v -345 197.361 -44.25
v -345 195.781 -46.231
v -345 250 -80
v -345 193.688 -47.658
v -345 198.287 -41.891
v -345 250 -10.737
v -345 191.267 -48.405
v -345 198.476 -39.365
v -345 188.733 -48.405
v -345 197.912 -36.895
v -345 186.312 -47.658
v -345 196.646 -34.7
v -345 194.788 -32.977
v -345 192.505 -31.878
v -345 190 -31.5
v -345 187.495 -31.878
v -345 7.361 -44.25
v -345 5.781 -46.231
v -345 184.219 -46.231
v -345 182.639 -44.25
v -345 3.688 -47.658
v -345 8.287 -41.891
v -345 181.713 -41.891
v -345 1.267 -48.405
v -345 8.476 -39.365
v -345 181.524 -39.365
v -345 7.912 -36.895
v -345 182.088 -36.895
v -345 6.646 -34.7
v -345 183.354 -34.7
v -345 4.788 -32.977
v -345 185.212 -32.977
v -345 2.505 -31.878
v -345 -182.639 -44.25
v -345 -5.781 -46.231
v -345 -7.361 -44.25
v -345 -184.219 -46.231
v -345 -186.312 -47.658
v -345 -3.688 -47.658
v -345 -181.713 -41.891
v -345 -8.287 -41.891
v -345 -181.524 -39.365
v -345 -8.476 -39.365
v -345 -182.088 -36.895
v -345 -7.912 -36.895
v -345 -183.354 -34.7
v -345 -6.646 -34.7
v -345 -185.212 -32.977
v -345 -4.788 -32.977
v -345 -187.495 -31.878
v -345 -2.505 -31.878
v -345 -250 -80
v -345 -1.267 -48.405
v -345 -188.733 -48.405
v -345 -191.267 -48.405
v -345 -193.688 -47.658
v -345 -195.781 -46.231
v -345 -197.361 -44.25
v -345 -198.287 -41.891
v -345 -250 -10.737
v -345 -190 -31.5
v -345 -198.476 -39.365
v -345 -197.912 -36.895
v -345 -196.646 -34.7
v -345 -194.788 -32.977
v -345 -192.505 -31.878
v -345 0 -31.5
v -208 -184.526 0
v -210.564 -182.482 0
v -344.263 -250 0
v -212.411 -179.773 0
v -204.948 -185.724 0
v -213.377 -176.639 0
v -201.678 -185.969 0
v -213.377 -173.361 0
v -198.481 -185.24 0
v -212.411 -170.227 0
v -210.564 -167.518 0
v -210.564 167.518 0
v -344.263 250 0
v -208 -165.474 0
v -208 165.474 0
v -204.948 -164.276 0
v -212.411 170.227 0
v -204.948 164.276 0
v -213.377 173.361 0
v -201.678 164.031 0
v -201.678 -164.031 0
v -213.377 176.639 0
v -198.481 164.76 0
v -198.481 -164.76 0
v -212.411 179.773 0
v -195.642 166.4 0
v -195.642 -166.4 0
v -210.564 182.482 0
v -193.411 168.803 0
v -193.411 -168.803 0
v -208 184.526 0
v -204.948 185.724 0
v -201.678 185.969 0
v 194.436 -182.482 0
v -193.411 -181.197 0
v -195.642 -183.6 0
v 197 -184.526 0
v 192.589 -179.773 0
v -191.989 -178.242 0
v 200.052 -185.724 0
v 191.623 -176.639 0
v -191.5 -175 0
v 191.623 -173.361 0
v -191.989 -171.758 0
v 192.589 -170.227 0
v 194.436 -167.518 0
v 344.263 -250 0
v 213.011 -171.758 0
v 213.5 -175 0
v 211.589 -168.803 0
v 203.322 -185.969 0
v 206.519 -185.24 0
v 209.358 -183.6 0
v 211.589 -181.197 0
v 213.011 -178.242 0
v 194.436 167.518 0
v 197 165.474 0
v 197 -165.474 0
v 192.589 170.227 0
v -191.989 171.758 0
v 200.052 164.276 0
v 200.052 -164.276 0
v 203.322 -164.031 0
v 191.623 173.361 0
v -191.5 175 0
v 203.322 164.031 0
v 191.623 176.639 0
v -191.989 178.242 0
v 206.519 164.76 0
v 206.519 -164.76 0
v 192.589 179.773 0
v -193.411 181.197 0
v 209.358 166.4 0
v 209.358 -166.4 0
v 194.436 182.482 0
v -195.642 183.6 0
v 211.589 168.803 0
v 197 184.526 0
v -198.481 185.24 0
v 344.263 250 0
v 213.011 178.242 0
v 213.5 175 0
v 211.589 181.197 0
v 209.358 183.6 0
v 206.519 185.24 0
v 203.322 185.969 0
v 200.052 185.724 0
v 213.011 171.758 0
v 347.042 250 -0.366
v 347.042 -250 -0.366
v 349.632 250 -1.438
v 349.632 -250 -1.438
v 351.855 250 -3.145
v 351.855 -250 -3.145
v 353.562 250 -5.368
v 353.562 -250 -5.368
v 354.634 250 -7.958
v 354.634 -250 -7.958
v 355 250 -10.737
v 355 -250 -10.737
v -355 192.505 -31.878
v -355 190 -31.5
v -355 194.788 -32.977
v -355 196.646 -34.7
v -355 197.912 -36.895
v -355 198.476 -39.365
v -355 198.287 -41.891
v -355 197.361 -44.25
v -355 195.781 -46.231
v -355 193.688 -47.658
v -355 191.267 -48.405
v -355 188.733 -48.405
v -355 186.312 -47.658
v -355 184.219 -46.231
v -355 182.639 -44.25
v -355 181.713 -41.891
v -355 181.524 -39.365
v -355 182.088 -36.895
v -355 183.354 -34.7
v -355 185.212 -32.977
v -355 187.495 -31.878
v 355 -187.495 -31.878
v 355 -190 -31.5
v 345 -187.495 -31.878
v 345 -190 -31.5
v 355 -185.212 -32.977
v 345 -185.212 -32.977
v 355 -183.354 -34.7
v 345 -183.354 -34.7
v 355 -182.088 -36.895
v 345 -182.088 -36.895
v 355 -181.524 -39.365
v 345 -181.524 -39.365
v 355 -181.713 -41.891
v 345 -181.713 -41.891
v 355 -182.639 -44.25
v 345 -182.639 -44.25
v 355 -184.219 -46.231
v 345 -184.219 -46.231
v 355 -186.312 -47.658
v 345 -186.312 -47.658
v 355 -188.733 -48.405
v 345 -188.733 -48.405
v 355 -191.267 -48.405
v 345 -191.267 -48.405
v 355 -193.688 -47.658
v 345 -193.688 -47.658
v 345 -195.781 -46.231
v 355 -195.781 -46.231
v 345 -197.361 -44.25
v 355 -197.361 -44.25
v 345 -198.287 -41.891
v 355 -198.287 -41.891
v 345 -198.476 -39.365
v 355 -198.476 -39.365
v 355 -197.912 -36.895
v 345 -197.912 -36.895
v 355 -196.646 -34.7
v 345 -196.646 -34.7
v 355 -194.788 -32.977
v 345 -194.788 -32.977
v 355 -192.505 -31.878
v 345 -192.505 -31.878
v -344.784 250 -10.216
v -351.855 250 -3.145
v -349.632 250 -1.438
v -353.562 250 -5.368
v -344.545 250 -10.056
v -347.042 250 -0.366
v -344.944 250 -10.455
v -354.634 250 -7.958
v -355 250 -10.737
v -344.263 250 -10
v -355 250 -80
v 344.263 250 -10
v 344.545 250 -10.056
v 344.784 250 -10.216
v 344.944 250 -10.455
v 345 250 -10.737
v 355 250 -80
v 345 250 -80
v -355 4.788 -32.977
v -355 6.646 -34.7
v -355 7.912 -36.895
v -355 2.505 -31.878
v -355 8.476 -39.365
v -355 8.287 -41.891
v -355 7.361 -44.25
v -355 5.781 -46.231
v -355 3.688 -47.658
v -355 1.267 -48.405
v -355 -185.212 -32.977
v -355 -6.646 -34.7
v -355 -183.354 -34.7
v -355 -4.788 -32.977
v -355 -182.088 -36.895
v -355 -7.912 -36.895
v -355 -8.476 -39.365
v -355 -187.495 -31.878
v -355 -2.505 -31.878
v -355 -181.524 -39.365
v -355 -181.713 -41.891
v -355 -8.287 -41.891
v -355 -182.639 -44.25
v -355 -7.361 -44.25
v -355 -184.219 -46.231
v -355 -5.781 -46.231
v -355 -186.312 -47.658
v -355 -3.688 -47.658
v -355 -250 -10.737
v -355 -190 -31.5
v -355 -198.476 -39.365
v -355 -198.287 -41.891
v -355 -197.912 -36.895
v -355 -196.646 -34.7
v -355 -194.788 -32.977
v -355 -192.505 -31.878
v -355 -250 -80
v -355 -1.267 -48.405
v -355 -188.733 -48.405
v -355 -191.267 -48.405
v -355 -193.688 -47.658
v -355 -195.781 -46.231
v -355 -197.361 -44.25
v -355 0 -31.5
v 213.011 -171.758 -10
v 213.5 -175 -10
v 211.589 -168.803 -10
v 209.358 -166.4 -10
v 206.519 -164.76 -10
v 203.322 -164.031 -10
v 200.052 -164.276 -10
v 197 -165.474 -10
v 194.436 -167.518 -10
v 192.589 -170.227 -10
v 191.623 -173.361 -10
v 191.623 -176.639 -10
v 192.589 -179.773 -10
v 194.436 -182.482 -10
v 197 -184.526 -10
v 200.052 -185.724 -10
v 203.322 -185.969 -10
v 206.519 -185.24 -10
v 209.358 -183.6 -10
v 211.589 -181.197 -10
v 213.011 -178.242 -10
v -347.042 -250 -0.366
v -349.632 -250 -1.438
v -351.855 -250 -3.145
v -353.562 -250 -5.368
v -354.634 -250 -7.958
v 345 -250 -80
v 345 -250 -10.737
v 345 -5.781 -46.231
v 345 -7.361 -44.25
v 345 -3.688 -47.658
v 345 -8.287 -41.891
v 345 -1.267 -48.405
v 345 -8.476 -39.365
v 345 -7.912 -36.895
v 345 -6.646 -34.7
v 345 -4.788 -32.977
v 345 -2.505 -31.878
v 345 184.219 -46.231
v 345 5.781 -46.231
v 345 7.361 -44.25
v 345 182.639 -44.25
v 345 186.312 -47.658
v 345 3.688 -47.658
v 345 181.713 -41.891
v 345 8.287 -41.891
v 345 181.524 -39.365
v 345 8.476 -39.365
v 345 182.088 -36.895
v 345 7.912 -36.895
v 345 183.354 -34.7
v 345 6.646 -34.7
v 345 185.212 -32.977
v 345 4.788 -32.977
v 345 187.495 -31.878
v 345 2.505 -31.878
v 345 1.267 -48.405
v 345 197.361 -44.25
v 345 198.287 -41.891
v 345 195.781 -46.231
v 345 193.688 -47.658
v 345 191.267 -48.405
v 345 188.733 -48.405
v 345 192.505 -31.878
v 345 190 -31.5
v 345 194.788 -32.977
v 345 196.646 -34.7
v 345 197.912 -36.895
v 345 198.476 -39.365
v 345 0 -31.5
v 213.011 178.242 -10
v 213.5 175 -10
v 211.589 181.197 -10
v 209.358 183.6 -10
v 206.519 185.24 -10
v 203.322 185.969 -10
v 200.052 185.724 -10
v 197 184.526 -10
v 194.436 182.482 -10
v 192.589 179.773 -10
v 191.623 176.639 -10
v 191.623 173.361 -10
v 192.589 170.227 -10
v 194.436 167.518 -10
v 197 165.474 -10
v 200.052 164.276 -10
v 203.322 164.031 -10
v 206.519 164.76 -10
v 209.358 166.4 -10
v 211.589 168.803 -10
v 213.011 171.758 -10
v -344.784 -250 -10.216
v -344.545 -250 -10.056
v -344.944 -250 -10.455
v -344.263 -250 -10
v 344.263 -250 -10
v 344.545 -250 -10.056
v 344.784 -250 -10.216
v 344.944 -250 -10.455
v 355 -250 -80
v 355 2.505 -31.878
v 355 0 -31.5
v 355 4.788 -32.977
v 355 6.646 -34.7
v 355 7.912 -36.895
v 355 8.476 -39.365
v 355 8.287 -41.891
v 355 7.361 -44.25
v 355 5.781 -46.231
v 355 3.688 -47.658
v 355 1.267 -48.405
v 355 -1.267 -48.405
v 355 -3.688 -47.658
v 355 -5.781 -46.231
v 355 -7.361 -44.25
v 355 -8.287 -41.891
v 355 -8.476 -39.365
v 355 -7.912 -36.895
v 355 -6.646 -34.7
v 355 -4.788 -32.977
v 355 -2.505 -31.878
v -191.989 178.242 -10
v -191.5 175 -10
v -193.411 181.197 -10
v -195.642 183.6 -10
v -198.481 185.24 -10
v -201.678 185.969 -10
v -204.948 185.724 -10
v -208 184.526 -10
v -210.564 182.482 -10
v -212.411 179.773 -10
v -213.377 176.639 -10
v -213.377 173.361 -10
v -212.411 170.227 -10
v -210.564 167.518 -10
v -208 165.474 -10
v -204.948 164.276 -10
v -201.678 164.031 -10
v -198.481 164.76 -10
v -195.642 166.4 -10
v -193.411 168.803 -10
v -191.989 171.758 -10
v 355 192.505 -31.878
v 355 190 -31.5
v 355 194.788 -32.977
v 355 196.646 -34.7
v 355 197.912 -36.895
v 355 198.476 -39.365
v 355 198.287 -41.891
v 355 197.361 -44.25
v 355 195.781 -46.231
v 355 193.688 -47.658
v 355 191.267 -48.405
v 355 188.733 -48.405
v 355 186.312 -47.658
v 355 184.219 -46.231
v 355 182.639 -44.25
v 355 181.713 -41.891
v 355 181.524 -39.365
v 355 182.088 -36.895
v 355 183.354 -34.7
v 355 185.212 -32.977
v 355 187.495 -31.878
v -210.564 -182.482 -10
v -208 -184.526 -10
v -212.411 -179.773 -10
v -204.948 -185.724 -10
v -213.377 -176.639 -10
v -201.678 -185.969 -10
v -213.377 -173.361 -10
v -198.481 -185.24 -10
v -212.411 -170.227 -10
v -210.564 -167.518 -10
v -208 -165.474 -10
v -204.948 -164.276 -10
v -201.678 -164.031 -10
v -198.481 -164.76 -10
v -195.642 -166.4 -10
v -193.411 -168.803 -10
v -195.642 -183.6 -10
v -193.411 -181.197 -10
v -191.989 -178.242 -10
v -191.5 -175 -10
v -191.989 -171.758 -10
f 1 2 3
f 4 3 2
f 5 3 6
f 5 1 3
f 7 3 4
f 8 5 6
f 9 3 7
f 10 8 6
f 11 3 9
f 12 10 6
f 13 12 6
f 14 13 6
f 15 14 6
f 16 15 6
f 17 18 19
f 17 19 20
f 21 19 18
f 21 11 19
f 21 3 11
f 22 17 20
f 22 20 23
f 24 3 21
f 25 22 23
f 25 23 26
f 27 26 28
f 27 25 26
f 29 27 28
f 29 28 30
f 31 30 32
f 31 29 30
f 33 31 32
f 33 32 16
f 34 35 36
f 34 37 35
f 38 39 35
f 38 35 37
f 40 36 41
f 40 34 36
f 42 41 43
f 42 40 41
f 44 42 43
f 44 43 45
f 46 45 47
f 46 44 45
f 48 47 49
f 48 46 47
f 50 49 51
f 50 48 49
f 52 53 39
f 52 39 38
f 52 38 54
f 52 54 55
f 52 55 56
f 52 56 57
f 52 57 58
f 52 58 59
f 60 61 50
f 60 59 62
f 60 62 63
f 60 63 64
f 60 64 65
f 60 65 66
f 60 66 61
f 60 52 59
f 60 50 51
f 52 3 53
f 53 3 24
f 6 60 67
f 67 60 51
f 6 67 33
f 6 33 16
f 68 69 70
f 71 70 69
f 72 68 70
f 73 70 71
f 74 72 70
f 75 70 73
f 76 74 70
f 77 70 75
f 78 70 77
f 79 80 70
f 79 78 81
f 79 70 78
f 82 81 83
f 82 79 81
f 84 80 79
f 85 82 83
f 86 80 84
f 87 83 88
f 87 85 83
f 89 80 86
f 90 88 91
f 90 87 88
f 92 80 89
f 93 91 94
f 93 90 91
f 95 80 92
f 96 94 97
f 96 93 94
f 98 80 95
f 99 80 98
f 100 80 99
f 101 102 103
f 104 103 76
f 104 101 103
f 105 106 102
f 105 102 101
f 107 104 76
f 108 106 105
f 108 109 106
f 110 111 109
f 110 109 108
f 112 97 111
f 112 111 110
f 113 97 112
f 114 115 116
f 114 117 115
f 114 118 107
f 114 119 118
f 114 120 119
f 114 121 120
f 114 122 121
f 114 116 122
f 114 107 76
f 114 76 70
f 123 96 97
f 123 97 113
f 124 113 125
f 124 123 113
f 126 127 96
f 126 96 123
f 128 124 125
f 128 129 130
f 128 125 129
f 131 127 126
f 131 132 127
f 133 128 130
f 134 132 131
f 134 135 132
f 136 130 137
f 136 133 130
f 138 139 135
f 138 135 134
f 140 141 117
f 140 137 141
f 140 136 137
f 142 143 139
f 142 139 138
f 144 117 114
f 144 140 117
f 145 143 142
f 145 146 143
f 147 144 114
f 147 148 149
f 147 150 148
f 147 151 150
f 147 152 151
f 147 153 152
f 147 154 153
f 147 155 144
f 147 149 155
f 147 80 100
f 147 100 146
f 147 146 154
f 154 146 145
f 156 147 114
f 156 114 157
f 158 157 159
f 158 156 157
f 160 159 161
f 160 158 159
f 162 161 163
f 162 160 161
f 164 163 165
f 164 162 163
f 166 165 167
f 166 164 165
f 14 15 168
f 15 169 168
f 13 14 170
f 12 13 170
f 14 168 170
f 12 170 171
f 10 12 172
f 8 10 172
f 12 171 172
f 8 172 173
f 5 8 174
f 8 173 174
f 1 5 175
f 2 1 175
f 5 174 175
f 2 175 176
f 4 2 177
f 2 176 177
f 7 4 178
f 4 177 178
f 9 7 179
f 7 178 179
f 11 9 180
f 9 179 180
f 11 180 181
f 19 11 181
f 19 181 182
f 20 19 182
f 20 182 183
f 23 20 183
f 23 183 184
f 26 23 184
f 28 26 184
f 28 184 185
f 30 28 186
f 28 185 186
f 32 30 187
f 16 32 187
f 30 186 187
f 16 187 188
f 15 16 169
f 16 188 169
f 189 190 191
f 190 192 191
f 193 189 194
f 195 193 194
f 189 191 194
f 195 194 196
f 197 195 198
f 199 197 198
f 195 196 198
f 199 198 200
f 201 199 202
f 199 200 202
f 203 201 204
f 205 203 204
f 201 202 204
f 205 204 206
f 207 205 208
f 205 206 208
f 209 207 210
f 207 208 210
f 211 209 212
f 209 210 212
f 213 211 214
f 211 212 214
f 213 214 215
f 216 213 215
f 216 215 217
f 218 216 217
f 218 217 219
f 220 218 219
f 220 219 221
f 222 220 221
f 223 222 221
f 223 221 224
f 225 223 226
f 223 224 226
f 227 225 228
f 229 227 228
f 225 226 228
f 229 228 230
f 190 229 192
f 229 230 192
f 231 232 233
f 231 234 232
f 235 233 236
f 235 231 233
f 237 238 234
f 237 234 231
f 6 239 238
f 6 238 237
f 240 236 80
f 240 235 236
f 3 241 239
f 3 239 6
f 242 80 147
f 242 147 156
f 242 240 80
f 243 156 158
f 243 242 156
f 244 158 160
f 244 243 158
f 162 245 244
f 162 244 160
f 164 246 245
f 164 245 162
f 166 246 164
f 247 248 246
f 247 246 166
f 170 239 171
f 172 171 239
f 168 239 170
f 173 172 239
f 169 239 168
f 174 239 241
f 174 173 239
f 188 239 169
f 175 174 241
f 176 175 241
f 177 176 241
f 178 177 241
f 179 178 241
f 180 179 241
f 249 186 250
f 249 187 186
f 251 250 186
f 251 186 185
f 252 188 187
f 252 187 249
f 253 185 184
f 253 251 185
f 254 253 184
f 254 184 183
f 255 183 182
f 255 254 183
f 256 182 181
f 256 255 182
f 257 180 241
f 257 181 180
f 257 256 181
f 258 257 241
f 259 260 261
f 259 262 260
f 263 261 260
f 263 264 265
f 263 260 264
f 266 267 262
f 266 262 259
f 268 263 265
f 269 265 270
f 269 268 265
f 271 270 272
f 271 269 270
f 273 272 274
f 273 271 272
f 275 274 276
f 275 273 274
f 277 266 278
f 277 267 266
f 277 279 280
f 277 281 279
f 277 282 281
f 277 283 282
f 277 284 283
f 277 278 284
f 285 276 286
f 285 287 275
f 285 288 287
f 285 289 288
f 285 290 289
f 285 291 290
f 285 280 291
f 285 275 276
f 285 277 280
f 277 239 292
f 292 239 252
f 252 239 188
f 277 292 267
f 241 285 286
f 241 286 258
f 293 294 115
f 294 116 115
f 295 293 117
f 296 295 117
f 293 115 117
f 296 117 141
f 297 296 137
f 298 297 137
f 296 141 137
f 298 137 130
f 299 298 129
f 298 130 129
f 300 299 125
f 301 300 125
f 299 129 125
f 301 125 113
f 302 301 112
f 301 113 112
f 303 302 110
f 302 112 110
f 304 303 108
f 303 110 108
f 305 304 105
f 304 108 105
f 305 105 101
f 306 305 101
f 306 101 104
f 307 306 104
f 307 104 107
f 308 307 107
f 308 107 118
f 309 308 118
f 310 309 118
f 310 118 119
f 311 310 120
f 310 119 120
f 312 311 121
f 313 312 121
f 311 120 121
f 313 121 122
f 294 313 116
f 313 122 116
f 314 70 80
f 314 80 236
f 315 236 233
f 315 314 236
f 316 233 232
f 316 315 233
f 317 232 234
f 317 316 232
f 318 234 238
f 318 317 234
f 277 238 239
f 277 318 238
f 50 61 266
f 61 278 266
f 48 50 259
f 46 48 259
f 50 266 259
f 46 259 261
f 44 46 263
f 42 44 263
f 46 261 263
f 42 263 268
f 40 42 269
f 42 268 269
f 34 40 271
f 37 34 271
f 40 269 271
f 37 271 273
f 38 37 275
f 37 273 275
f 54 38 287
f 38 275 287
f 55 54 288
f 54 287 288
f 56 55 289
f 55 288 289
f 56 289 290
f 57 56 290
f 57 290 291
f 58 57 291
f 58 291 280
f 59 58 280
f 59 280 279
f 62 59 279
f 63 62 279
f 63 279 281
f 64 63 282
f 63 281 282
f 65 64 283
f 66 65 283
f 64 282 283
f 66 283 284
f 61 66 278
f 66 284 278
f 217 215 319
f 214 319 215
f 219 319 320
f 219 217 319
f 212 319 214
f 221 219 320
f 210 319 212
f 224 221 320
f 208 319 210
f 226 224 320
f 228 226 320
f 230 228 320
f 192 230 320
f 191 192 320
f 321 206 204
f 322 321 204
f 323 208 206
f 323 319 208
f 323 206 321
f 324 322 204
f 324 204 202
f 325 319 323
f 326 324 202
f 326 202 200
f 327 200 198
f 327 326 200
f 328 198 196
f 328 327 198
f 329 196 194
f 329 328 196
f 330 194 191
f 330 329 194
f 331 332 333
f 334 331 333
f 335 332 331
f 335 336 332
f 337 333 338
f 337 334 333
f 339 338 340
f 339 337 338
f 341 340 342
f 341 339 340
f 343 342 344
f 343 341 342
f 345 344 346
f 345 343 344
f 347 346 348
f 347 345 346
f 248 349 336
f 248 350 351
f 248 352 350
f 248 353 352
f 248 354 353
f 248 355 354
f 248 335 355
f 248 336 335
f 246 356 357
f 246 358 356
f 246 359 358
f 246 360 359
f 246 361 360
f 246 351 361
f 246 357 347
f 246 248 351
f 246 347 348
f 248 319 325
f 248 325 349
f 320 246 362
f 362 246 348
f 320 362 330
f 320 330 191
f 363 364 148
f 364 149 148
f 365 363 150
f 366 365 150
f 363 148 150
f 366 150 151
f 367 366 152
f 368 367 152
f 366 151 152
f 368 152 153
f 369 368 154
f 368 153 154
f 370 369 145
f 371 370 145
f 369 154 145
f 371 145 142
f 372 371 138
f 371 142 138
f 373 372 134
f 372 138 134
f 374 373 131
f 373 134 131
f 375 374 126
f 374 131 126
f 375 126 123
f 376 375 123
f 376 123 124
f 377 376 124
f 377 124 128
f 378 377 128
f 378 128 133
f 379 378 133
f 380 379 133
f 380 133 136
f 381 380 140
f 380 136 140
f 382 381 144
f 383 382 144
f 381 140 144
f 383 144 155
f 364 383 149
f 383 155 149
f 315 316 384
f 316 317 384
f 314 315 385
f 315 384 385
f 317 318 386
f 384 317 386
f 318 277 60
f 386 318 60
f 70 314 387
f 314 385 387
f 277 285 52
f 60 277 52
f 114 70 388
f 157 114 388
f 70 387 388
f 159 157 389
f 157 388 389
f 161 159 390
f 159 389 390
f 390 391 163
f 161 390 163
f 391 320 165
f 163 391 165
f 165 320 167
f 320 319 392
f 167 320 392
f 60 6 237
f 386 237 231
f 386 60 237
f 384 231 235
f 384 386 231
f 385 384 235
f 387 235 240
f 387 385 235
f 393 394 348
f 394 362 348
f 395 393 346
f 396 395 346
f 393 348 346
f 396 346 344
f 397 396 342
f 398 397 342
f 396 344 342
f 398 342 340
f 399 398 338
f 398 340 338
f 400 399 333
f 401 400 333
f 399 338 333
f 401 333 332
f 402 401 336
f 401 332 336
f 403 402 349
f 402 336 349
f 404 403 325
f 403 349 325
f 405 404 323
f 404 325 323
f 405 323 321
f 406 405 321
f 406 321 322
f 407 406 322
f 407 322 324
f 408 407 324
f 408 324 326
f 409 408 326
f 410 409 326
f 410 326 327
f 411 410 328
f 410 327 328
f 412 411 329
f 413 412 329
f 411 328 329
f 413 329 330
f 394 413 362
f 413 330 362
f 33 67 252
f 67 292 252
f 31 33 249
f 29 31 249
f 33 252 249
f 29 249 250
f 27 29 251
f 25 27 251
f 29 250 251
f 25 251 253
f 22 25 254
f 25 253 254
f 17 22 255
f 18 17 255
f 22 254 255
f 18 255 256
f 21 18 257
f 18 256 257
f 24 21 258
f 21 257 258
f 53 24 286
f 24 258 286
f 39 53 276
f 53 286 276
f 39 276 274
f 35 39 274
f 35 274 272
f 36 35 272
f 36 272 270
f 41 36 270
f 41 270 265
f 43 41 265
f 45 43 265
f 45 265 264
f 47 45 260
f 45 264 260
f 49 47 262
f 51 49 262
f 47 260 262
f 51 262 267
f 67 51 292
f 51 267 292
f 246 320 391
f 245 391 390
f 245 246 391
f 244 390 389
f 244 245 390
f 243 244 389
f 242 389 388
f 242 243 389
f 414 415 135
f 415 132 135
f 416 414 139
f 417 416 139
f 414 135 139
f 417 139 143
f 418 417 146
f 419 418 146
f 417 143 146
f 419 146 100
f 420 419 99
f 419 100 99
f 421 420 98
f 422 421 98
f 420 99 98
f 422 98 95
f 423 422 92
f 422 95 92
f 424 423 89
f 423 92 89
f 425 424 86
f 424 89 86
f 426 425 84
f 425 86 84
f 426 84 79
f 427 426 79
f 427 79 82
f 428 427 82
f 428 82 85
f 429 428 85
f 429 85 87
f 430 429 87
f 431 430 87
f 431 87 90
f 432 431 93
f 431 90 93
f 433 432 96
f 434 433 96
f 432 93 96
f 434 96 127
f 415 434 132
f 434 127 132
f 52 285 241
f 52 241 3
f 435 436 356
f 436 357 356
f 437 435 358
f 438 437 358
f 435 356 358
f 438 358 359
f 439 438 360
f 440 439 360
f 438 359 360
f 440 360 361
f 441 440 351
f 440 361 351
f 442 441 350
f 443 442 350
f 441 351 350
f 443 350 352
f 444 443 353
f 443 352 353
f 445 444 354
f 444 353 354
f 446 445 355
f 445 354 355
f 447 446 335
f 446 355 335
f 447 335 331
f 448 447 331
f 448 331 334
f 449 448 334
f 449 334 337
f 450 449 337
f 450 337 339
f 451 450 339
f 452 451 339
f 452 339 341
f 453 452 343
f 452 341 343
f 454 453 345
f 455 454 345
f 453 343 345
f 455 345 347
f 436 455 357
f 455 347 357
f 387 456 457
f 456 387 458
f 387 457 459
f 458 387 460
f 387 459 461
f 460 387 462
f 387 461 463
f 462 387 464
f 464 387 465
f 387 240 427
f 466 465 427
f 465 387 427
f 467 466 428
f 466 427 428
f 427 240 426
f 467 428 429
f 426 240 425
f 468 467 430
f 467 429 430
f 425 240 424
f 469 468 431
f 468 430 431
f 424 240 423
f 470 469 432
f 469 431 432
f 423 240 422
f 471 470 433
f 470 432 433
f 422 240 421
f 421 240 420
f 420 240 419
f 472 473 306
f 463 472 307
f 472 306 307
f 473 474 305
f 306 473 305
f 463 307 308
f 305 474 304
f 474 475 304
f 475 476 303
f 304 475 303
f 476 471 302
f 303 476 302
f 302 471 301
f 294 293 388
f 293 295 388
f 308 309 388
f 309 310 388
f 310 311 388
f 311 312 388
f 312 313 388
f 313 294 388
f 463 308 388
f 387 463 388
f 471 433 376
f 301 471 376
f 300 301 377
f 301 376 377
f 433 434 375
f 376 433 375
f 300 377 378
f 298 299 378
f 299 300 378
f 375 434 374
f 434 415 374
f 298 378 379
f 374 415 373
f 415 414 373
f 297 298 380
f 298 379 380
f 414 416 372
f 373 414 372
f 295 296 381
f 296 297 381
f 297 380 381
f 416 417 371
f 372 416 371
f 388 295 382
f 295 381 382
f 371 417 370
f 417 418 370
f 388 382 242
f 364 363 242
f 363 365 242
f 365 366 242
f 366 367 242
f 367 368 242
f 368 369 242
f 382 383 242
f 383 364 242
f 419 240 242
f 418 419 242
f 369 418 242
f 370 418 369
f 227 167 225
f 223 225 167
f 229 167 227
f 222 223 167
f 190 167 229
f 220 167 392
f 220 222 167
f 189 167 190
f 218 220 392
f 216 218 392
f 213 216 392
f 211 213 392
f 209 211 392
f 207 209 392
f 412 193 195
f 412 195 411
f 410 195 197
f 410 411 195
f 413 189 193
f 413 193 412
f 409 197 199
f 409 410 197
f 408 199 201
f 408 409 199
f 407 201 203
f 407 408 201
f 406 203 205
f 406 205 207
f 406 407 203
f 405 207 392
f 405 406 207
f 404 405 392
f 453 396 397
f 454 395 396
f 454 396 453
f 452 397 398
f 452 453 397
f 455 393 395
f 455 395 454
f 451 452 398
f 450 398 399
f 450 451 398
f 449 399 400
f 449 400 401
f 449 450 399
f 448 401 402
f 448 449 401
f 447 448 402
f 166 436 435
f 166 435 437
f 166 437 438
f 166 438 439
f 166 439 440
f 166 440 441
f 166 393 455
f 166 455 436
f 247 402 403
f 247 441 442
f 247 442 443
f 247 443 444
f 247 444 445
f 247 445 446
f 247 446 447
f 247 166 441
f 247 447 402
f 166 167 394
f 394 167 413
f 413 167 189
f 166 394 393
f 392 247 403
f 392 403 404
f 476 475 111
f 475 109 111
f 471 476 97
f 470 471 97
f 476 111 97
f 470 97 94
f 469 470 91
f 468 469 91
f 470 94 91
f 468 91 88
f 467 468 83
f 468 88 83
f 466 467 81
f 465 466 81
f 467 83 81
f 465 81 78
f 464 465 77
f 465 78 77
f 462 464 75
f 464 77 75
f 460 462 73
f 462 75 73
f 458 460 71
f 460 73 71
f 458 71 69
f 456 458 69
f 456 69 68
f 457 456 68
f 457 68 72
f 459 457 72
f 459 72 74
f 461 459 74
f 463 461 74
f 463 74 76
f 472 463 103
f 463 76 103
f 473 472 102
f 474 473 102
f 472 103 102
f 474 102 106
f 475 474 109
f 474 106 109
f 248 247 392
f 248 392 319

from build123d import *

# Parameters (mm, degrees)
SKETCH1_W                    = 710
SKETCH1_H                    = 500
BASE_FLANGE1_DEPTH           = 10
EDGE_FLANGE1_STRIP_W         = 41.4732
EDGE_FLANGE1_STRIP_H         = 10
EDGE_FLANGE1_STRIP_CUT_DEPTH = 500
EDGE_FLANGE1_DEPTH           = 500
EDGE_FLANGE2_STRIP_W         = 41.4732
EDGE_FLANGE2_STRIP_H         = 10
EDGE_FLANGE2_STRIP_CUT_DEPTH = 500
EDGE_FLANGE2_DEPTH           = 500
SKETCH12_R                   = 8.5
CUT_EXTRUDE1_DEPTH           = 757.967634711
LPATTERN1_COUNT              = 3
LPATTERN1_PITCH              = 190
SKETCH13_R                   = 11
CUT_EXTRUDE2_DEPTH           = 442.503114372
LPATTERN2_COUNT              = 2
LPATTERN2_PITCH              = 405
LPATTERN2_COUNT_DIR2         = 2
LPATTERN2_PITCH_DIR2         = 350


# Sheet-metal steps are written as plain solids
with BuildPart() as part:
    # Sketch1 → Base-Flange1 (new body)
    with BuildSketch(Plane.XY):
        Rectangle(SKETCH1_W, SKETCH1_H)
    extrude(amount=-BASE_FLANGE1_DEPTH)

    # Edge-Flange1 strip (across the edge) → Edge-Flange1 strip cut (cut)
    with BuildSketch(Plane(origin=(-355, -250, -10), x_dir=(1, 0, 0), z_dir=(0, 1, 0))):
        with Locations((-10, -5)):
            Rectangle(EDGE_FLANGE1_STRIP_W, EDGE_FLANGE1_STRIP_H)
    extrude(amount=EDGE_FLANGE1_STRIP_CUT_DEPTH, mode=Mode.SUBTRACT)

    # Edge-Flange1 section (across the edge) → Edge-Flange1 (add)
    with BuildSketch(Plane(origin=(-355, -250, -10), x_dir=(1, 0, 0), z_dir=(0, 1, 0))):
        with BuildLine():
            Line((0, 0.7366), (0, 70))
            Line((0, 70), (10, 70))
            Line((10, 70), (10, 0.7366))
            ThreePointArc((10, 0.7366), (10.215745145, 0.215745145), (10.7366, 0))
            Line((10.7366, 0), (10.7366, -10))
            ThreePointArc((10.7366, -10), (3.144677333, -6.855322667), (0, 0.7366))
        make_face()
    extrude(amount=EDGE_FLANGE1_DEPTH)

    # Edge-Flange2 strip (across the edge) → Edge-Flange2 strip cut (cut)
    with BuildSketch(Plane(origin=(355, 250, -10), x_dir=(-1, 0, 0), z_dir=(0, -1, 0))):
        with Locations((-10, -5)):
            Rectangle(EDGE_FLANGE2_STRIP_W, EDGE_FLANGE2_STRIP_H)
    extrude(amount=EDGE_FLANGE2_STRIP_CUT_DEPTH, mode=Mode.SUBTRACT)

    # Edge-Flange2 section (across the edge) → Edge-Flange2 (add)
    with BuildSketch(Plane(origin=(355, 250, -10), x_dir=(-1, 0, 0), z_dir=(0, -1, 0))):
        with BuildLine():
            Line((0, 0.7366), (0, 70))
            Line((0, 70), (10, 70))
            Line((10, 70), (10, 0.7366))
            ThreePointArc((10, 0.7366), (10.215745145, 0.215745145), (10.7366, 0))
            Line((10.7366, 0), (10.7366, -10))
            ThreePointArc((10.7366, -10), (3.144677333, -6.855322667), (0, 0.7366))
        make_face()
    extrude(amount=EDGE_FLANGE2_DEPTH)

    # Sketch12 → Cut-Extrude1 (cut, symmetric)
    with BuildSketch(Plane.ZY.offset(355)):
        with Locations((-40, 190)):
            Circle(SKETCH12_R)
    cut_extrude1 = extrude(amount=CUT_EXTRUDE1_DEPTH, both=True, mode=Mode.SUBTRACT)

    # LPattern1: Cut-Extrude1 ×3
    with Locations(*[(0, -i * LPATTERN1_PITCH, 0) for i in range(1, LPATTERN1_COUNT)]):
        add(cut_extrude1, mode=Mode.SUBTRACT)

    # Sketch13 → Cut-Extrude2 (cut, symmetric)
    with BuildSketch(Plane.XY):
        with Locations((202.5, 175)):
            Circle(SKETCH13_R)
    cut_extrude2 = extrude(amount=CUT_EXTRUDE2_DEPTH, both=True, mode=Mode.SUBTRACT)

    # LPattern2: Cut-Extrude2 2 × 2
    with Locations(*[(-i * LPATTERN2_PITCH, -j * LPATTERN2_PITCH_DIR2, 0) for i in range(LPATTERN2_COUNT) for j in range(LPATTERN2_COUNT_DIR2) if (i, j) != (0, 0)]):
        add(cut_extrude2, mode=Mode.SUBTRACT)


solid = part.part
